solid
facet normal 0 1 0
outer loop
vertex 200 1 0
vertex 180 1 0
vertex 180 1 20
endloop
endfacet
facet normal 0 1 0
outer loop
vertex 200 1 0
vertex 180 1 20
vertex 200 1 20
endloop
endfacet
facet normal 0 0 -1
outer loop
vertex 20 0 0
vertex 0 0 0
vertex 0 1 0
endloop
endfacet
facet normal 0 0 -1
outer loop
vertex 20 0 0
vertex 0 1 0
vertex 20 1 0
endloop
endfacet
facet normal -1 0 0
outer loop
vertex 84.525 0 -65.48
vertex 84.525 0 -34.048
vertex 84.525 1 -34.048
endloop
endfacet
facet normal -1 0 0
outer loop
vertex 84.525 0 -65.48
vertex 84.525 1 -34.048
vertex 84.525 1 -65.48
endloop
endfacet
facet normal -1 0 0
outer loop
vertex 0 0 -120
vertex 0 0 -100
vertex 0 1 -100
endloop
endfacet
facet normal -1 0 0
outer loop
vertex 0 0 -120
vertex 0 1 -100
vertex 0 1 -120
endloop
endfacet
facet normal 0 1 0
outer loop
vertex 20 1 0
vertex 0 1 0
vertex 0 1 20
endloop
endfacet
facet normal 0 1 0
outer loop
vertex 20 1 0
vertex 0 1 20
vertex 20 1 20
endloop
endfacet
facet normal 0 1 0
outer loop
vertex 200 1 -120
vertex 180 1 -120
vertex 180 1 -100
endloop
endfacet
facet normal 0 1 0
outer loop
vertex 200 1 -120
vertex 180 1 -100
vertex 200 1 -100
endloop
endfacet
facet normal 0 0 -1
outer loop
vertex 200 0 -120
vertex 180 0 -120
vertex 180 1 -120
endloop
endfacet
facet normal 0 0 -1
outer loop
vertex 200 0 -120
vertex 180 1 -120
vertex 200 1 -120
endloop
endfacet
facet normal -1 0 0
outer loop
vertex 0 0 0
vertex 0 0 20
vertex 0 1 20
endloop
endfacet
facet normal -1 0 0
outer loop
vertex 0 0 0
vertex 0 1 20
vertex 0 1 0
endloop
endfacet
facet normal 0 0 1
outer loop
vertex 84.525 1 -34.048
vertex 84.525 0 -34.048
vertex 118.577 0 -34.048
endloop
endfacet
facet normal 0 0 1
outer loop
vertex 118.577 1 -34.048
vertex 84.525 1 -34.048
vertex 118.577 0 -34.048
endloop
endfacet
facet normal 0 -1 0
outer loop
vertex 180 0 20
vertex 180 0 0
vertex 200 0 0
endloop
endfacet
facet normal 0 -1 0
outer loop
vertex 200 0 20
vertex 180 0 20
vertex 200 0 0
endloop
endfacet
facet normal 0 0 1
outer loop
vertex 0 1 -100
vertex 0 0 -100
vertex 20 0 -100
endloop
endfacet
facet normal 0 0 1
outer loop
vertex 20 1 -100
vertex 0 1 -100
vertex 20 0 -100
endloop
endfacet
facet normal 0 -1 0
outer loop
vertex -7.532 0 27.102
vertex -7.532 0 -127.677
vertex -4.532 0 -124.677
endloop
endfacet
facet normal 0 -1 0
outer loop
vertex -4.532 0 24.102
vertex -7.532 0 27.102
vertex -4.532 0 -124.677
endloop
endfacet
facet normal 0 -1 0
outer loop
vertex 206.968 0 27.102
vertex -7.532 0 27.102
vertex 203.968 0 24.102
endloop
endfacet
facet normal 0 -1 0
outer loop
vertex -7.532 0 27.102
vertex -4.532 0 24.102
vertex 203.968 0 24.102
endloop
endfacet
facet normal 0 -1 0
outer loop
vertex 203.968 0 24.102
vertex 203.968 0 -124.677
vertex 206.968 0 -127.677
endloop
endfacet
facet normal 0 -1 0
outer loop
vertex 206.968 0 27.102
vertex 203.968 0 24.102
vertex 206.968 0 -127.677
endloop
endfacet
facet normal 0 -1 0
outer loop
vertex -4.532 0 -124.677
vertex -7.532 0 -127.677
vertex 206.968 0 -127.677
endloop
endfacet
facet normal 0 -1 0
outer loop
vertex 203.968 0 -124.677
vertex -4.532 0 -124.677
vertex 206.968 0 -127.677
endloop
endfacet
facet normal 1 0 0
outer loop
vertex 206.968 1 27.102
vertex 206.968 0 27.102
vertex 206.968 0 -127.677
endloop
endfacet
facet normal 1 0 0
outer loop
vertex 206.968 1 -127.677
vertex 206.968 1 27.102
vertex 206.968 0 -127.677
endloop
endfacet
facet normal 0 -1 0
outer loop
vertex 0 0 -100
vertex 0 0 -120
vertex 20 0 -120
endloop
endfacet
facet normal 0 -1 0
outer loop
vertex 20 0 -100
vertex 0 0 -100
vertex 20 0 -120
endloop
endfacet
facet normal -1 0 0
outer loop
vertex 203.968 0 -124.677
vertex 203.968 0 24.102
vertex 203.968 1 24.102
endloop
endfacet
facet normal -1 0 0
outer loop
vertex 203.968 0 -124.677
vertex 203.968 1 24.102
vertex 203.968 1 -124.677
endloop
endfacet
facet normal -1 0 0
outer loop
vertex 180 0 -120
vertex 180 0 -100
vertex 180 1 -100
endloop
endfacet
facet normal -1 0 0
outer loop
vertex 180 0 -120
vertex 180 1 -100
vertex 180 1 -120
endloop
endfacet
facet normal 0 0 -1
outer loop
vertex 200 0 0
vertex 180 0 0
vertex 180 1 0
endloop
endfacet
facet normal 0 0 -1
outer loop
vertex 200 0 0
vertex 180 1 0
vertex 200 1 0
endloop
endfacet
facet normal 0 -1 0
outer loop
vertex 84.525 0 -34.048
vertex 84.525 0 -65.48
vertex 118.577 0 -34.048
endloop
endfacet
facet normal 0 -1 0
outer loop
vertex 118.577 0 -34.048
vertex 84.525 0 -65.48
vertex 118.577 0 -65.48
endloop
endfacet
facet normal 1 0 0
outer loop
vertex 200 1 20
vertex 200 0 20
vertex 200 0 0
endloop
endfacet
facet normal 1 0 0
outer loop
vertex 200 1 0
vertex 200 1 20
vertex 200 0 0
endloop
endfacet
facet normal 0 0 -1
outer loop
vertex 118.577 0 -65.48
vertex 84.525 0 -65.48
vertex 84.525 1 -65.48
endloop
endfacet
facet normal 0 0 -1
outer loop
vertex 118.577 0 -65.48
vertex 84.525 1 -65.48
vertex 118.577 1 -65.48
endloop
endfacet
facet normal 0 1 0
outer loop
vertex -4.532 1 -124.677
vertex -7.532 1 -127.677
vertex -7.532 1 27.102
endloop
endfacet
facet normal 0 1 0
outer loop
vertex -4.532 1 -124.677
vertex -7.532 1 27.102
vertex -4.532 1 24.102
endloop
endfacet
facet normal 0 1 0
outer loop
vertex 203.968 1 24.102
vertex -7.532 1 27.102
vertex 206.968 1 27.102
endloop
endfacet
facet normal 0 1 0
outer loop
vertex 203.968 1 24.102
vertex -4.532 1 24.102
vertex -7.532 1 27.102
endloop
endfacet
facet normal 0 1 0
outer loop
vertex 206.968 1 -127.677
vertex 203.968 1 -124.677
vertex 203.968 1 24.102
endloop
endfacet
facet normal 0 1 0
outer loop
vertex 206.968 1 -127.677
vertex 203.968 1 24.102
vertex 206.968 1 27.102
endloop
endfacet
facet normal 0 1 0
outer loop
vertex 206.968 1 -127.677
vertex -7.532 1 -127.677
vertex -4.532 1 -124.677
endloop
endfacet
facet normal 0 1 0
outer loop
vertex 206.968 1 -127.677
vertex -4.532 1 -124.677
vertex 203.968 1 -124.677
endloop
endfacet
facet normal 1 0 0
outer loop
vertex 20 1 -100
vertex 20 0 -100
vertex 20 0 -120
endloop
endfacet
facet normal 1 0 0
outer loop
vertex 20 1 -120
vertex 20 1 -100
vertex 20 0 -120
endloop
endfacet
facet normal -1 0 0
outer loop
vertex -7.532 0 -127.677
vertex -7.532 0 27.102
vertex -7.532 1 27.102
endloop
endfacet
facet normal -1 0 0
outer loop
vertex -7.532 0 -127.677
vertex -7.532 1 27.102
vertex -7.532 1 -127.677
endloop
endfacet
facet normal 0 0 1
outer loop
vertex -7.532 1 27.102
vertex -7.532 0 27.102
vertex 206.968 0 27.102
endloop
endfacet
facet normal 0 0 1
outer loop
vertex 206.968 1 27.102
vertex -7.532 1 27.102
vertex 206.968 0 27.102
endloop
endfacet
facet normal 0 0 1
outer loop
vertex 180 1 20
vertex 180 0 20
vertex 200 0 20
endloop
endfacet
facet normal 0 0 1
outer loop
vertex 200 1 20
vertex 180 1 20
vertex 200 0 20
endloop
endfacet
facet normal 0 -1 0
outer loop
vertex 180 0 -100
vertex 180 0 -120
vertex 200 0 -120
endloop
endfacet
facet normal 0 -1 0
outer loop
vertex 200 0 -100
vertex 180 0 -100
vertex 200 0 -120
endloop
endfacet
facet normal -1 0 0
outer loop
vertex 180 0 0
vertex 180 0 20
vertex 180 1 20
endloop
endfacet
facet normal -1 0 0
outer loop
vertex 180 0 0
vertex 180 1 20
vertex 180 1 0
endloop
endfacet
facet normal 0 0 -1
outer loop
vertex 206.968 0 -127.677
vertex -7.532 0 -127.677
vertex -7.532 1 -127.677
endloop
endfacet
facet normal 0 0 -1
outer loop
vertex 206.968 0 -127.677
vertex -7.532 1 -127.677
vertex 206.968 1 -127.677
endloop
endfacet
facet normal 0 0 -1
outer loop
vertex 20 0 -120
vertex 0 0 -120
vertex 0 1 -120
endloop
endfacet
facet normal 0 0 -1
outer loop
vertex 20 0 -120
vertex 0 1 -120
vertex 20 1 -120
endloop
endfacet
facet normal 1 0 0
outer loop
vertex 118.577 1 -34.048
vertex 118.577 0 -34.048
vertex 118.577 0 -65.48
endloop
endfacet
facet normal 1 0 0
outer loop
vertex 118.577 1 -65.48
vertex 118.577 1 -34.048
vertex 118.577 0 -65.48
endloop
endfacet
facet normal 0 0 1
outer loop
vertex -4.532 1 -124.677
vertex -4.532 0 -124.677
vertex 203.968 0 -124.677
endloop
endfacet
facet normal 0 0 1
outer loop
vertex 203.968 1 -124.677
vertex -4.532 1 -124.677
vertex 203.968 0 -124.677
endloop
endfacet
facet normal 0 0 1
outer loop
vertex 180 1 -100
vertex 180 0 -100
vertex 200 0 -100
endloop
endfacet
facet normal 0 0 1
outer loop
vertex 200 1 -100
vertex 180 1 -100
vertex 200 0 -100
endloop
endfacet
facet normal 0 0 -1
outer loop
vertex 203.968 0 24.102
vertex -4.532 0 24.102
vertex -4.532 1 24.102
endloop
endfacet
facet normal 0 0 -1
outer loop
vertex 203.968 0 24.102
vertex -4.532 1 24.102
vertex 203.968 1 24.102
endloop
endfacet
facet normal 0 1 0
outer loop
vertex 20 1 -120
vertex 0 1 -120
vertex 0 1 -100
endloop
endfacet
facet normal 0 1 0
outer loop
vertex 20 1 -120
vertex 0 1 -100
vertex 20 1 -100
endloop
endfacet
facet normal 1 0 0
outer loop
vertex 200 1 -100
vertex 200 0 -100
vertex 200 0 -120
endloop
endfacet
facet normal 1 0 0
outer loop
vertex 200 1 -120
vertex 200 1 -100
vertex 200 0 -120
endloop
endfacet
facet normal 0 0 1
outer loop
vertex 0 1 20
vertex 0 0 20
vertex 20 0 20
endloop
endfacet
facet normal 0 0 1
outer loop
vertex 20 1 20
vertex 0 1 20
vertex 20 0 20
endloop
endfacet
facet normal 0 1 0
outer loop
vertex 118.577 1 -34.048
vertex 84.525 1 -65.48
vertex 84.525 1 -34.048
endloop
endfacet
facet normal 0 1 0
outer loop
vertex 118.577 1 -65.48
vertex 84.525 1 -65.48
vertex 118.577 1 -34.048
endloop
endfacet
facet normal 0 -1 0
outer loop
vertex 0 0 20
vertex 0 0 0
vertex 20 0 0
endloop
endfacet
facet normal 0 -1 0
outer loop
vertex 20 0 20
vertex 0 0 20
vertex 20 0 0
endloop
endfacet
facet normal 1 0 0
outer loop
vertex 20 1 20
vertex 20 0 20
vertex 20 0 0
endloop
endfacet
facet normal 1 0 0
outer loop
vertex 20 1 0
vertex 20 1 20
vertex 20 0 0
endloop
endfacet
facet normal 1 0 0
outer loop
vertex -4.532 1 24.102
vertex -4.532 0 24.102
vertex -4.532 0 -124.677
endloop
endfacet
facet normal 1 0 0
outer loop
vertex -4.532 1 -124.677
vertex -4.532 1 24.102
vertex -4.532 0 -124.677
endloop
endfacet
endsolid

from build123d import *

# Parameters (mm, degrees)
SKETCH_1_W        = 214.500056991
SKETCH_1_H        = 154.77893514
SKETCH_1_W_2      = 208.500056991
SKETCH_1_H_2      = 148.77893514
EXTRUDE_1_DEPTH   = 1
SKETCH_1_W_3      = 20
SKETCH_1_H_3      = 20
EXTRUDE_1_2_DEPTH = 1
EXTRUDE_1_3_DEPTH = 1
SKETCH_1_W_4      = 34.051516846
SKETCH_1_H_4      = 31.432169396
EXTRUDE_1_4_DEPTH = 1
EXTRUDE_1_5_DEPTH = 1
EXTRUDE_1_6_DEPTH = 1


with BuildPart() as part:
    # 草图1 → 凸台-拉伸1 (new body)
    with BuildSketch(Plane(origin=(0, 0, 0), x_dir=(1, 0, 0), z_dir=(0, 1, 0))):
        with Locations((99.717581207, 50.2876223)):
            Rectangle(SKETCH_1_W, SKETCH_1_H)
        with Locations((99.717581207, 50.2876223)):
            Rectangle(SKETCH_1_W_2, SKETCH_1_H_2, mode=Mode.SUBTRACT)
    extrude(amount=EXTRUDE_1_DEPTH)


with BuildPart() as body_2:
    # 草图1 → Extrude 1 2 (new body)
    with BuildSketch(Plane(origin=(0, 0, 0), x_dir=(1, 0, 0), z_dir=(0, 1, 0))):
        with Locations((10, 110)):
            Rectangle(SKETCH_1_W_3, SKETCH_1_H_3)
    extrude(amount=EXTRUDE_1_2_DEPTH)


with BuildPart() as body_3:
    # 草图1 → Extrude 1 3 (new body)
    with BuildSketch(Plane(origin=(0, 0, 0), x_dir=(1, 0, 0), z_dir=(0, 1, 0))):
        with Locations((10, -10)):
            Rectangle(SKETCH_1_W_3, SKETCH_1_H_3)
    extrude(amount=EXTRUDE_1_3_DEPTH)


with BuildPart() as body_4:
    # 草图1 → Extrude 1 4 (new body)
    with BuildSketch(Plane(origin=(0, 0, 0), x_dir=(1, 0, 0), z_dir=(0, 1, 0))):
        with Locations((101.551124421, 49.76375281)):
            Rectangle(SKETCH_1_W_4, SKETCH_1_H_4)
    extrude(amount=EXTRUDE_1_4_DEPTH)


with BuildPart() as body_5:
    # 草图1 → Extrude 1 5 (new body)
    with BuildSketch(Plane(origin=(0, 0, 0), x_dir=(1, 0, 0), z_dir=(0, 1, 0))):
        with Locations((190, 110)):
            Rectangle(SKETCH_1_W_3, SKETCH_1_H_3)
    extrude(amount=EXTRUDE_1_5_DEPTH)


with BuildPart() as body_6:
    # 草图1 → Extrude 1 6 (new body)
    with BuildSketch(Plane(origin=(0, 0, 0), x_dir=(1, 0, 0), z_dir=(0, 1, 0))):
        with Locations((190, -10)):
            Rectangle(SKETCH_1_W_3, SKETCH_1_H_3)
    extrude(amount=EXTRUDE_1_6_DEPTH)


solid = Compound([part.part, body_2.part, body_3.part, body_4.part, body_5.part, body_6.part])
